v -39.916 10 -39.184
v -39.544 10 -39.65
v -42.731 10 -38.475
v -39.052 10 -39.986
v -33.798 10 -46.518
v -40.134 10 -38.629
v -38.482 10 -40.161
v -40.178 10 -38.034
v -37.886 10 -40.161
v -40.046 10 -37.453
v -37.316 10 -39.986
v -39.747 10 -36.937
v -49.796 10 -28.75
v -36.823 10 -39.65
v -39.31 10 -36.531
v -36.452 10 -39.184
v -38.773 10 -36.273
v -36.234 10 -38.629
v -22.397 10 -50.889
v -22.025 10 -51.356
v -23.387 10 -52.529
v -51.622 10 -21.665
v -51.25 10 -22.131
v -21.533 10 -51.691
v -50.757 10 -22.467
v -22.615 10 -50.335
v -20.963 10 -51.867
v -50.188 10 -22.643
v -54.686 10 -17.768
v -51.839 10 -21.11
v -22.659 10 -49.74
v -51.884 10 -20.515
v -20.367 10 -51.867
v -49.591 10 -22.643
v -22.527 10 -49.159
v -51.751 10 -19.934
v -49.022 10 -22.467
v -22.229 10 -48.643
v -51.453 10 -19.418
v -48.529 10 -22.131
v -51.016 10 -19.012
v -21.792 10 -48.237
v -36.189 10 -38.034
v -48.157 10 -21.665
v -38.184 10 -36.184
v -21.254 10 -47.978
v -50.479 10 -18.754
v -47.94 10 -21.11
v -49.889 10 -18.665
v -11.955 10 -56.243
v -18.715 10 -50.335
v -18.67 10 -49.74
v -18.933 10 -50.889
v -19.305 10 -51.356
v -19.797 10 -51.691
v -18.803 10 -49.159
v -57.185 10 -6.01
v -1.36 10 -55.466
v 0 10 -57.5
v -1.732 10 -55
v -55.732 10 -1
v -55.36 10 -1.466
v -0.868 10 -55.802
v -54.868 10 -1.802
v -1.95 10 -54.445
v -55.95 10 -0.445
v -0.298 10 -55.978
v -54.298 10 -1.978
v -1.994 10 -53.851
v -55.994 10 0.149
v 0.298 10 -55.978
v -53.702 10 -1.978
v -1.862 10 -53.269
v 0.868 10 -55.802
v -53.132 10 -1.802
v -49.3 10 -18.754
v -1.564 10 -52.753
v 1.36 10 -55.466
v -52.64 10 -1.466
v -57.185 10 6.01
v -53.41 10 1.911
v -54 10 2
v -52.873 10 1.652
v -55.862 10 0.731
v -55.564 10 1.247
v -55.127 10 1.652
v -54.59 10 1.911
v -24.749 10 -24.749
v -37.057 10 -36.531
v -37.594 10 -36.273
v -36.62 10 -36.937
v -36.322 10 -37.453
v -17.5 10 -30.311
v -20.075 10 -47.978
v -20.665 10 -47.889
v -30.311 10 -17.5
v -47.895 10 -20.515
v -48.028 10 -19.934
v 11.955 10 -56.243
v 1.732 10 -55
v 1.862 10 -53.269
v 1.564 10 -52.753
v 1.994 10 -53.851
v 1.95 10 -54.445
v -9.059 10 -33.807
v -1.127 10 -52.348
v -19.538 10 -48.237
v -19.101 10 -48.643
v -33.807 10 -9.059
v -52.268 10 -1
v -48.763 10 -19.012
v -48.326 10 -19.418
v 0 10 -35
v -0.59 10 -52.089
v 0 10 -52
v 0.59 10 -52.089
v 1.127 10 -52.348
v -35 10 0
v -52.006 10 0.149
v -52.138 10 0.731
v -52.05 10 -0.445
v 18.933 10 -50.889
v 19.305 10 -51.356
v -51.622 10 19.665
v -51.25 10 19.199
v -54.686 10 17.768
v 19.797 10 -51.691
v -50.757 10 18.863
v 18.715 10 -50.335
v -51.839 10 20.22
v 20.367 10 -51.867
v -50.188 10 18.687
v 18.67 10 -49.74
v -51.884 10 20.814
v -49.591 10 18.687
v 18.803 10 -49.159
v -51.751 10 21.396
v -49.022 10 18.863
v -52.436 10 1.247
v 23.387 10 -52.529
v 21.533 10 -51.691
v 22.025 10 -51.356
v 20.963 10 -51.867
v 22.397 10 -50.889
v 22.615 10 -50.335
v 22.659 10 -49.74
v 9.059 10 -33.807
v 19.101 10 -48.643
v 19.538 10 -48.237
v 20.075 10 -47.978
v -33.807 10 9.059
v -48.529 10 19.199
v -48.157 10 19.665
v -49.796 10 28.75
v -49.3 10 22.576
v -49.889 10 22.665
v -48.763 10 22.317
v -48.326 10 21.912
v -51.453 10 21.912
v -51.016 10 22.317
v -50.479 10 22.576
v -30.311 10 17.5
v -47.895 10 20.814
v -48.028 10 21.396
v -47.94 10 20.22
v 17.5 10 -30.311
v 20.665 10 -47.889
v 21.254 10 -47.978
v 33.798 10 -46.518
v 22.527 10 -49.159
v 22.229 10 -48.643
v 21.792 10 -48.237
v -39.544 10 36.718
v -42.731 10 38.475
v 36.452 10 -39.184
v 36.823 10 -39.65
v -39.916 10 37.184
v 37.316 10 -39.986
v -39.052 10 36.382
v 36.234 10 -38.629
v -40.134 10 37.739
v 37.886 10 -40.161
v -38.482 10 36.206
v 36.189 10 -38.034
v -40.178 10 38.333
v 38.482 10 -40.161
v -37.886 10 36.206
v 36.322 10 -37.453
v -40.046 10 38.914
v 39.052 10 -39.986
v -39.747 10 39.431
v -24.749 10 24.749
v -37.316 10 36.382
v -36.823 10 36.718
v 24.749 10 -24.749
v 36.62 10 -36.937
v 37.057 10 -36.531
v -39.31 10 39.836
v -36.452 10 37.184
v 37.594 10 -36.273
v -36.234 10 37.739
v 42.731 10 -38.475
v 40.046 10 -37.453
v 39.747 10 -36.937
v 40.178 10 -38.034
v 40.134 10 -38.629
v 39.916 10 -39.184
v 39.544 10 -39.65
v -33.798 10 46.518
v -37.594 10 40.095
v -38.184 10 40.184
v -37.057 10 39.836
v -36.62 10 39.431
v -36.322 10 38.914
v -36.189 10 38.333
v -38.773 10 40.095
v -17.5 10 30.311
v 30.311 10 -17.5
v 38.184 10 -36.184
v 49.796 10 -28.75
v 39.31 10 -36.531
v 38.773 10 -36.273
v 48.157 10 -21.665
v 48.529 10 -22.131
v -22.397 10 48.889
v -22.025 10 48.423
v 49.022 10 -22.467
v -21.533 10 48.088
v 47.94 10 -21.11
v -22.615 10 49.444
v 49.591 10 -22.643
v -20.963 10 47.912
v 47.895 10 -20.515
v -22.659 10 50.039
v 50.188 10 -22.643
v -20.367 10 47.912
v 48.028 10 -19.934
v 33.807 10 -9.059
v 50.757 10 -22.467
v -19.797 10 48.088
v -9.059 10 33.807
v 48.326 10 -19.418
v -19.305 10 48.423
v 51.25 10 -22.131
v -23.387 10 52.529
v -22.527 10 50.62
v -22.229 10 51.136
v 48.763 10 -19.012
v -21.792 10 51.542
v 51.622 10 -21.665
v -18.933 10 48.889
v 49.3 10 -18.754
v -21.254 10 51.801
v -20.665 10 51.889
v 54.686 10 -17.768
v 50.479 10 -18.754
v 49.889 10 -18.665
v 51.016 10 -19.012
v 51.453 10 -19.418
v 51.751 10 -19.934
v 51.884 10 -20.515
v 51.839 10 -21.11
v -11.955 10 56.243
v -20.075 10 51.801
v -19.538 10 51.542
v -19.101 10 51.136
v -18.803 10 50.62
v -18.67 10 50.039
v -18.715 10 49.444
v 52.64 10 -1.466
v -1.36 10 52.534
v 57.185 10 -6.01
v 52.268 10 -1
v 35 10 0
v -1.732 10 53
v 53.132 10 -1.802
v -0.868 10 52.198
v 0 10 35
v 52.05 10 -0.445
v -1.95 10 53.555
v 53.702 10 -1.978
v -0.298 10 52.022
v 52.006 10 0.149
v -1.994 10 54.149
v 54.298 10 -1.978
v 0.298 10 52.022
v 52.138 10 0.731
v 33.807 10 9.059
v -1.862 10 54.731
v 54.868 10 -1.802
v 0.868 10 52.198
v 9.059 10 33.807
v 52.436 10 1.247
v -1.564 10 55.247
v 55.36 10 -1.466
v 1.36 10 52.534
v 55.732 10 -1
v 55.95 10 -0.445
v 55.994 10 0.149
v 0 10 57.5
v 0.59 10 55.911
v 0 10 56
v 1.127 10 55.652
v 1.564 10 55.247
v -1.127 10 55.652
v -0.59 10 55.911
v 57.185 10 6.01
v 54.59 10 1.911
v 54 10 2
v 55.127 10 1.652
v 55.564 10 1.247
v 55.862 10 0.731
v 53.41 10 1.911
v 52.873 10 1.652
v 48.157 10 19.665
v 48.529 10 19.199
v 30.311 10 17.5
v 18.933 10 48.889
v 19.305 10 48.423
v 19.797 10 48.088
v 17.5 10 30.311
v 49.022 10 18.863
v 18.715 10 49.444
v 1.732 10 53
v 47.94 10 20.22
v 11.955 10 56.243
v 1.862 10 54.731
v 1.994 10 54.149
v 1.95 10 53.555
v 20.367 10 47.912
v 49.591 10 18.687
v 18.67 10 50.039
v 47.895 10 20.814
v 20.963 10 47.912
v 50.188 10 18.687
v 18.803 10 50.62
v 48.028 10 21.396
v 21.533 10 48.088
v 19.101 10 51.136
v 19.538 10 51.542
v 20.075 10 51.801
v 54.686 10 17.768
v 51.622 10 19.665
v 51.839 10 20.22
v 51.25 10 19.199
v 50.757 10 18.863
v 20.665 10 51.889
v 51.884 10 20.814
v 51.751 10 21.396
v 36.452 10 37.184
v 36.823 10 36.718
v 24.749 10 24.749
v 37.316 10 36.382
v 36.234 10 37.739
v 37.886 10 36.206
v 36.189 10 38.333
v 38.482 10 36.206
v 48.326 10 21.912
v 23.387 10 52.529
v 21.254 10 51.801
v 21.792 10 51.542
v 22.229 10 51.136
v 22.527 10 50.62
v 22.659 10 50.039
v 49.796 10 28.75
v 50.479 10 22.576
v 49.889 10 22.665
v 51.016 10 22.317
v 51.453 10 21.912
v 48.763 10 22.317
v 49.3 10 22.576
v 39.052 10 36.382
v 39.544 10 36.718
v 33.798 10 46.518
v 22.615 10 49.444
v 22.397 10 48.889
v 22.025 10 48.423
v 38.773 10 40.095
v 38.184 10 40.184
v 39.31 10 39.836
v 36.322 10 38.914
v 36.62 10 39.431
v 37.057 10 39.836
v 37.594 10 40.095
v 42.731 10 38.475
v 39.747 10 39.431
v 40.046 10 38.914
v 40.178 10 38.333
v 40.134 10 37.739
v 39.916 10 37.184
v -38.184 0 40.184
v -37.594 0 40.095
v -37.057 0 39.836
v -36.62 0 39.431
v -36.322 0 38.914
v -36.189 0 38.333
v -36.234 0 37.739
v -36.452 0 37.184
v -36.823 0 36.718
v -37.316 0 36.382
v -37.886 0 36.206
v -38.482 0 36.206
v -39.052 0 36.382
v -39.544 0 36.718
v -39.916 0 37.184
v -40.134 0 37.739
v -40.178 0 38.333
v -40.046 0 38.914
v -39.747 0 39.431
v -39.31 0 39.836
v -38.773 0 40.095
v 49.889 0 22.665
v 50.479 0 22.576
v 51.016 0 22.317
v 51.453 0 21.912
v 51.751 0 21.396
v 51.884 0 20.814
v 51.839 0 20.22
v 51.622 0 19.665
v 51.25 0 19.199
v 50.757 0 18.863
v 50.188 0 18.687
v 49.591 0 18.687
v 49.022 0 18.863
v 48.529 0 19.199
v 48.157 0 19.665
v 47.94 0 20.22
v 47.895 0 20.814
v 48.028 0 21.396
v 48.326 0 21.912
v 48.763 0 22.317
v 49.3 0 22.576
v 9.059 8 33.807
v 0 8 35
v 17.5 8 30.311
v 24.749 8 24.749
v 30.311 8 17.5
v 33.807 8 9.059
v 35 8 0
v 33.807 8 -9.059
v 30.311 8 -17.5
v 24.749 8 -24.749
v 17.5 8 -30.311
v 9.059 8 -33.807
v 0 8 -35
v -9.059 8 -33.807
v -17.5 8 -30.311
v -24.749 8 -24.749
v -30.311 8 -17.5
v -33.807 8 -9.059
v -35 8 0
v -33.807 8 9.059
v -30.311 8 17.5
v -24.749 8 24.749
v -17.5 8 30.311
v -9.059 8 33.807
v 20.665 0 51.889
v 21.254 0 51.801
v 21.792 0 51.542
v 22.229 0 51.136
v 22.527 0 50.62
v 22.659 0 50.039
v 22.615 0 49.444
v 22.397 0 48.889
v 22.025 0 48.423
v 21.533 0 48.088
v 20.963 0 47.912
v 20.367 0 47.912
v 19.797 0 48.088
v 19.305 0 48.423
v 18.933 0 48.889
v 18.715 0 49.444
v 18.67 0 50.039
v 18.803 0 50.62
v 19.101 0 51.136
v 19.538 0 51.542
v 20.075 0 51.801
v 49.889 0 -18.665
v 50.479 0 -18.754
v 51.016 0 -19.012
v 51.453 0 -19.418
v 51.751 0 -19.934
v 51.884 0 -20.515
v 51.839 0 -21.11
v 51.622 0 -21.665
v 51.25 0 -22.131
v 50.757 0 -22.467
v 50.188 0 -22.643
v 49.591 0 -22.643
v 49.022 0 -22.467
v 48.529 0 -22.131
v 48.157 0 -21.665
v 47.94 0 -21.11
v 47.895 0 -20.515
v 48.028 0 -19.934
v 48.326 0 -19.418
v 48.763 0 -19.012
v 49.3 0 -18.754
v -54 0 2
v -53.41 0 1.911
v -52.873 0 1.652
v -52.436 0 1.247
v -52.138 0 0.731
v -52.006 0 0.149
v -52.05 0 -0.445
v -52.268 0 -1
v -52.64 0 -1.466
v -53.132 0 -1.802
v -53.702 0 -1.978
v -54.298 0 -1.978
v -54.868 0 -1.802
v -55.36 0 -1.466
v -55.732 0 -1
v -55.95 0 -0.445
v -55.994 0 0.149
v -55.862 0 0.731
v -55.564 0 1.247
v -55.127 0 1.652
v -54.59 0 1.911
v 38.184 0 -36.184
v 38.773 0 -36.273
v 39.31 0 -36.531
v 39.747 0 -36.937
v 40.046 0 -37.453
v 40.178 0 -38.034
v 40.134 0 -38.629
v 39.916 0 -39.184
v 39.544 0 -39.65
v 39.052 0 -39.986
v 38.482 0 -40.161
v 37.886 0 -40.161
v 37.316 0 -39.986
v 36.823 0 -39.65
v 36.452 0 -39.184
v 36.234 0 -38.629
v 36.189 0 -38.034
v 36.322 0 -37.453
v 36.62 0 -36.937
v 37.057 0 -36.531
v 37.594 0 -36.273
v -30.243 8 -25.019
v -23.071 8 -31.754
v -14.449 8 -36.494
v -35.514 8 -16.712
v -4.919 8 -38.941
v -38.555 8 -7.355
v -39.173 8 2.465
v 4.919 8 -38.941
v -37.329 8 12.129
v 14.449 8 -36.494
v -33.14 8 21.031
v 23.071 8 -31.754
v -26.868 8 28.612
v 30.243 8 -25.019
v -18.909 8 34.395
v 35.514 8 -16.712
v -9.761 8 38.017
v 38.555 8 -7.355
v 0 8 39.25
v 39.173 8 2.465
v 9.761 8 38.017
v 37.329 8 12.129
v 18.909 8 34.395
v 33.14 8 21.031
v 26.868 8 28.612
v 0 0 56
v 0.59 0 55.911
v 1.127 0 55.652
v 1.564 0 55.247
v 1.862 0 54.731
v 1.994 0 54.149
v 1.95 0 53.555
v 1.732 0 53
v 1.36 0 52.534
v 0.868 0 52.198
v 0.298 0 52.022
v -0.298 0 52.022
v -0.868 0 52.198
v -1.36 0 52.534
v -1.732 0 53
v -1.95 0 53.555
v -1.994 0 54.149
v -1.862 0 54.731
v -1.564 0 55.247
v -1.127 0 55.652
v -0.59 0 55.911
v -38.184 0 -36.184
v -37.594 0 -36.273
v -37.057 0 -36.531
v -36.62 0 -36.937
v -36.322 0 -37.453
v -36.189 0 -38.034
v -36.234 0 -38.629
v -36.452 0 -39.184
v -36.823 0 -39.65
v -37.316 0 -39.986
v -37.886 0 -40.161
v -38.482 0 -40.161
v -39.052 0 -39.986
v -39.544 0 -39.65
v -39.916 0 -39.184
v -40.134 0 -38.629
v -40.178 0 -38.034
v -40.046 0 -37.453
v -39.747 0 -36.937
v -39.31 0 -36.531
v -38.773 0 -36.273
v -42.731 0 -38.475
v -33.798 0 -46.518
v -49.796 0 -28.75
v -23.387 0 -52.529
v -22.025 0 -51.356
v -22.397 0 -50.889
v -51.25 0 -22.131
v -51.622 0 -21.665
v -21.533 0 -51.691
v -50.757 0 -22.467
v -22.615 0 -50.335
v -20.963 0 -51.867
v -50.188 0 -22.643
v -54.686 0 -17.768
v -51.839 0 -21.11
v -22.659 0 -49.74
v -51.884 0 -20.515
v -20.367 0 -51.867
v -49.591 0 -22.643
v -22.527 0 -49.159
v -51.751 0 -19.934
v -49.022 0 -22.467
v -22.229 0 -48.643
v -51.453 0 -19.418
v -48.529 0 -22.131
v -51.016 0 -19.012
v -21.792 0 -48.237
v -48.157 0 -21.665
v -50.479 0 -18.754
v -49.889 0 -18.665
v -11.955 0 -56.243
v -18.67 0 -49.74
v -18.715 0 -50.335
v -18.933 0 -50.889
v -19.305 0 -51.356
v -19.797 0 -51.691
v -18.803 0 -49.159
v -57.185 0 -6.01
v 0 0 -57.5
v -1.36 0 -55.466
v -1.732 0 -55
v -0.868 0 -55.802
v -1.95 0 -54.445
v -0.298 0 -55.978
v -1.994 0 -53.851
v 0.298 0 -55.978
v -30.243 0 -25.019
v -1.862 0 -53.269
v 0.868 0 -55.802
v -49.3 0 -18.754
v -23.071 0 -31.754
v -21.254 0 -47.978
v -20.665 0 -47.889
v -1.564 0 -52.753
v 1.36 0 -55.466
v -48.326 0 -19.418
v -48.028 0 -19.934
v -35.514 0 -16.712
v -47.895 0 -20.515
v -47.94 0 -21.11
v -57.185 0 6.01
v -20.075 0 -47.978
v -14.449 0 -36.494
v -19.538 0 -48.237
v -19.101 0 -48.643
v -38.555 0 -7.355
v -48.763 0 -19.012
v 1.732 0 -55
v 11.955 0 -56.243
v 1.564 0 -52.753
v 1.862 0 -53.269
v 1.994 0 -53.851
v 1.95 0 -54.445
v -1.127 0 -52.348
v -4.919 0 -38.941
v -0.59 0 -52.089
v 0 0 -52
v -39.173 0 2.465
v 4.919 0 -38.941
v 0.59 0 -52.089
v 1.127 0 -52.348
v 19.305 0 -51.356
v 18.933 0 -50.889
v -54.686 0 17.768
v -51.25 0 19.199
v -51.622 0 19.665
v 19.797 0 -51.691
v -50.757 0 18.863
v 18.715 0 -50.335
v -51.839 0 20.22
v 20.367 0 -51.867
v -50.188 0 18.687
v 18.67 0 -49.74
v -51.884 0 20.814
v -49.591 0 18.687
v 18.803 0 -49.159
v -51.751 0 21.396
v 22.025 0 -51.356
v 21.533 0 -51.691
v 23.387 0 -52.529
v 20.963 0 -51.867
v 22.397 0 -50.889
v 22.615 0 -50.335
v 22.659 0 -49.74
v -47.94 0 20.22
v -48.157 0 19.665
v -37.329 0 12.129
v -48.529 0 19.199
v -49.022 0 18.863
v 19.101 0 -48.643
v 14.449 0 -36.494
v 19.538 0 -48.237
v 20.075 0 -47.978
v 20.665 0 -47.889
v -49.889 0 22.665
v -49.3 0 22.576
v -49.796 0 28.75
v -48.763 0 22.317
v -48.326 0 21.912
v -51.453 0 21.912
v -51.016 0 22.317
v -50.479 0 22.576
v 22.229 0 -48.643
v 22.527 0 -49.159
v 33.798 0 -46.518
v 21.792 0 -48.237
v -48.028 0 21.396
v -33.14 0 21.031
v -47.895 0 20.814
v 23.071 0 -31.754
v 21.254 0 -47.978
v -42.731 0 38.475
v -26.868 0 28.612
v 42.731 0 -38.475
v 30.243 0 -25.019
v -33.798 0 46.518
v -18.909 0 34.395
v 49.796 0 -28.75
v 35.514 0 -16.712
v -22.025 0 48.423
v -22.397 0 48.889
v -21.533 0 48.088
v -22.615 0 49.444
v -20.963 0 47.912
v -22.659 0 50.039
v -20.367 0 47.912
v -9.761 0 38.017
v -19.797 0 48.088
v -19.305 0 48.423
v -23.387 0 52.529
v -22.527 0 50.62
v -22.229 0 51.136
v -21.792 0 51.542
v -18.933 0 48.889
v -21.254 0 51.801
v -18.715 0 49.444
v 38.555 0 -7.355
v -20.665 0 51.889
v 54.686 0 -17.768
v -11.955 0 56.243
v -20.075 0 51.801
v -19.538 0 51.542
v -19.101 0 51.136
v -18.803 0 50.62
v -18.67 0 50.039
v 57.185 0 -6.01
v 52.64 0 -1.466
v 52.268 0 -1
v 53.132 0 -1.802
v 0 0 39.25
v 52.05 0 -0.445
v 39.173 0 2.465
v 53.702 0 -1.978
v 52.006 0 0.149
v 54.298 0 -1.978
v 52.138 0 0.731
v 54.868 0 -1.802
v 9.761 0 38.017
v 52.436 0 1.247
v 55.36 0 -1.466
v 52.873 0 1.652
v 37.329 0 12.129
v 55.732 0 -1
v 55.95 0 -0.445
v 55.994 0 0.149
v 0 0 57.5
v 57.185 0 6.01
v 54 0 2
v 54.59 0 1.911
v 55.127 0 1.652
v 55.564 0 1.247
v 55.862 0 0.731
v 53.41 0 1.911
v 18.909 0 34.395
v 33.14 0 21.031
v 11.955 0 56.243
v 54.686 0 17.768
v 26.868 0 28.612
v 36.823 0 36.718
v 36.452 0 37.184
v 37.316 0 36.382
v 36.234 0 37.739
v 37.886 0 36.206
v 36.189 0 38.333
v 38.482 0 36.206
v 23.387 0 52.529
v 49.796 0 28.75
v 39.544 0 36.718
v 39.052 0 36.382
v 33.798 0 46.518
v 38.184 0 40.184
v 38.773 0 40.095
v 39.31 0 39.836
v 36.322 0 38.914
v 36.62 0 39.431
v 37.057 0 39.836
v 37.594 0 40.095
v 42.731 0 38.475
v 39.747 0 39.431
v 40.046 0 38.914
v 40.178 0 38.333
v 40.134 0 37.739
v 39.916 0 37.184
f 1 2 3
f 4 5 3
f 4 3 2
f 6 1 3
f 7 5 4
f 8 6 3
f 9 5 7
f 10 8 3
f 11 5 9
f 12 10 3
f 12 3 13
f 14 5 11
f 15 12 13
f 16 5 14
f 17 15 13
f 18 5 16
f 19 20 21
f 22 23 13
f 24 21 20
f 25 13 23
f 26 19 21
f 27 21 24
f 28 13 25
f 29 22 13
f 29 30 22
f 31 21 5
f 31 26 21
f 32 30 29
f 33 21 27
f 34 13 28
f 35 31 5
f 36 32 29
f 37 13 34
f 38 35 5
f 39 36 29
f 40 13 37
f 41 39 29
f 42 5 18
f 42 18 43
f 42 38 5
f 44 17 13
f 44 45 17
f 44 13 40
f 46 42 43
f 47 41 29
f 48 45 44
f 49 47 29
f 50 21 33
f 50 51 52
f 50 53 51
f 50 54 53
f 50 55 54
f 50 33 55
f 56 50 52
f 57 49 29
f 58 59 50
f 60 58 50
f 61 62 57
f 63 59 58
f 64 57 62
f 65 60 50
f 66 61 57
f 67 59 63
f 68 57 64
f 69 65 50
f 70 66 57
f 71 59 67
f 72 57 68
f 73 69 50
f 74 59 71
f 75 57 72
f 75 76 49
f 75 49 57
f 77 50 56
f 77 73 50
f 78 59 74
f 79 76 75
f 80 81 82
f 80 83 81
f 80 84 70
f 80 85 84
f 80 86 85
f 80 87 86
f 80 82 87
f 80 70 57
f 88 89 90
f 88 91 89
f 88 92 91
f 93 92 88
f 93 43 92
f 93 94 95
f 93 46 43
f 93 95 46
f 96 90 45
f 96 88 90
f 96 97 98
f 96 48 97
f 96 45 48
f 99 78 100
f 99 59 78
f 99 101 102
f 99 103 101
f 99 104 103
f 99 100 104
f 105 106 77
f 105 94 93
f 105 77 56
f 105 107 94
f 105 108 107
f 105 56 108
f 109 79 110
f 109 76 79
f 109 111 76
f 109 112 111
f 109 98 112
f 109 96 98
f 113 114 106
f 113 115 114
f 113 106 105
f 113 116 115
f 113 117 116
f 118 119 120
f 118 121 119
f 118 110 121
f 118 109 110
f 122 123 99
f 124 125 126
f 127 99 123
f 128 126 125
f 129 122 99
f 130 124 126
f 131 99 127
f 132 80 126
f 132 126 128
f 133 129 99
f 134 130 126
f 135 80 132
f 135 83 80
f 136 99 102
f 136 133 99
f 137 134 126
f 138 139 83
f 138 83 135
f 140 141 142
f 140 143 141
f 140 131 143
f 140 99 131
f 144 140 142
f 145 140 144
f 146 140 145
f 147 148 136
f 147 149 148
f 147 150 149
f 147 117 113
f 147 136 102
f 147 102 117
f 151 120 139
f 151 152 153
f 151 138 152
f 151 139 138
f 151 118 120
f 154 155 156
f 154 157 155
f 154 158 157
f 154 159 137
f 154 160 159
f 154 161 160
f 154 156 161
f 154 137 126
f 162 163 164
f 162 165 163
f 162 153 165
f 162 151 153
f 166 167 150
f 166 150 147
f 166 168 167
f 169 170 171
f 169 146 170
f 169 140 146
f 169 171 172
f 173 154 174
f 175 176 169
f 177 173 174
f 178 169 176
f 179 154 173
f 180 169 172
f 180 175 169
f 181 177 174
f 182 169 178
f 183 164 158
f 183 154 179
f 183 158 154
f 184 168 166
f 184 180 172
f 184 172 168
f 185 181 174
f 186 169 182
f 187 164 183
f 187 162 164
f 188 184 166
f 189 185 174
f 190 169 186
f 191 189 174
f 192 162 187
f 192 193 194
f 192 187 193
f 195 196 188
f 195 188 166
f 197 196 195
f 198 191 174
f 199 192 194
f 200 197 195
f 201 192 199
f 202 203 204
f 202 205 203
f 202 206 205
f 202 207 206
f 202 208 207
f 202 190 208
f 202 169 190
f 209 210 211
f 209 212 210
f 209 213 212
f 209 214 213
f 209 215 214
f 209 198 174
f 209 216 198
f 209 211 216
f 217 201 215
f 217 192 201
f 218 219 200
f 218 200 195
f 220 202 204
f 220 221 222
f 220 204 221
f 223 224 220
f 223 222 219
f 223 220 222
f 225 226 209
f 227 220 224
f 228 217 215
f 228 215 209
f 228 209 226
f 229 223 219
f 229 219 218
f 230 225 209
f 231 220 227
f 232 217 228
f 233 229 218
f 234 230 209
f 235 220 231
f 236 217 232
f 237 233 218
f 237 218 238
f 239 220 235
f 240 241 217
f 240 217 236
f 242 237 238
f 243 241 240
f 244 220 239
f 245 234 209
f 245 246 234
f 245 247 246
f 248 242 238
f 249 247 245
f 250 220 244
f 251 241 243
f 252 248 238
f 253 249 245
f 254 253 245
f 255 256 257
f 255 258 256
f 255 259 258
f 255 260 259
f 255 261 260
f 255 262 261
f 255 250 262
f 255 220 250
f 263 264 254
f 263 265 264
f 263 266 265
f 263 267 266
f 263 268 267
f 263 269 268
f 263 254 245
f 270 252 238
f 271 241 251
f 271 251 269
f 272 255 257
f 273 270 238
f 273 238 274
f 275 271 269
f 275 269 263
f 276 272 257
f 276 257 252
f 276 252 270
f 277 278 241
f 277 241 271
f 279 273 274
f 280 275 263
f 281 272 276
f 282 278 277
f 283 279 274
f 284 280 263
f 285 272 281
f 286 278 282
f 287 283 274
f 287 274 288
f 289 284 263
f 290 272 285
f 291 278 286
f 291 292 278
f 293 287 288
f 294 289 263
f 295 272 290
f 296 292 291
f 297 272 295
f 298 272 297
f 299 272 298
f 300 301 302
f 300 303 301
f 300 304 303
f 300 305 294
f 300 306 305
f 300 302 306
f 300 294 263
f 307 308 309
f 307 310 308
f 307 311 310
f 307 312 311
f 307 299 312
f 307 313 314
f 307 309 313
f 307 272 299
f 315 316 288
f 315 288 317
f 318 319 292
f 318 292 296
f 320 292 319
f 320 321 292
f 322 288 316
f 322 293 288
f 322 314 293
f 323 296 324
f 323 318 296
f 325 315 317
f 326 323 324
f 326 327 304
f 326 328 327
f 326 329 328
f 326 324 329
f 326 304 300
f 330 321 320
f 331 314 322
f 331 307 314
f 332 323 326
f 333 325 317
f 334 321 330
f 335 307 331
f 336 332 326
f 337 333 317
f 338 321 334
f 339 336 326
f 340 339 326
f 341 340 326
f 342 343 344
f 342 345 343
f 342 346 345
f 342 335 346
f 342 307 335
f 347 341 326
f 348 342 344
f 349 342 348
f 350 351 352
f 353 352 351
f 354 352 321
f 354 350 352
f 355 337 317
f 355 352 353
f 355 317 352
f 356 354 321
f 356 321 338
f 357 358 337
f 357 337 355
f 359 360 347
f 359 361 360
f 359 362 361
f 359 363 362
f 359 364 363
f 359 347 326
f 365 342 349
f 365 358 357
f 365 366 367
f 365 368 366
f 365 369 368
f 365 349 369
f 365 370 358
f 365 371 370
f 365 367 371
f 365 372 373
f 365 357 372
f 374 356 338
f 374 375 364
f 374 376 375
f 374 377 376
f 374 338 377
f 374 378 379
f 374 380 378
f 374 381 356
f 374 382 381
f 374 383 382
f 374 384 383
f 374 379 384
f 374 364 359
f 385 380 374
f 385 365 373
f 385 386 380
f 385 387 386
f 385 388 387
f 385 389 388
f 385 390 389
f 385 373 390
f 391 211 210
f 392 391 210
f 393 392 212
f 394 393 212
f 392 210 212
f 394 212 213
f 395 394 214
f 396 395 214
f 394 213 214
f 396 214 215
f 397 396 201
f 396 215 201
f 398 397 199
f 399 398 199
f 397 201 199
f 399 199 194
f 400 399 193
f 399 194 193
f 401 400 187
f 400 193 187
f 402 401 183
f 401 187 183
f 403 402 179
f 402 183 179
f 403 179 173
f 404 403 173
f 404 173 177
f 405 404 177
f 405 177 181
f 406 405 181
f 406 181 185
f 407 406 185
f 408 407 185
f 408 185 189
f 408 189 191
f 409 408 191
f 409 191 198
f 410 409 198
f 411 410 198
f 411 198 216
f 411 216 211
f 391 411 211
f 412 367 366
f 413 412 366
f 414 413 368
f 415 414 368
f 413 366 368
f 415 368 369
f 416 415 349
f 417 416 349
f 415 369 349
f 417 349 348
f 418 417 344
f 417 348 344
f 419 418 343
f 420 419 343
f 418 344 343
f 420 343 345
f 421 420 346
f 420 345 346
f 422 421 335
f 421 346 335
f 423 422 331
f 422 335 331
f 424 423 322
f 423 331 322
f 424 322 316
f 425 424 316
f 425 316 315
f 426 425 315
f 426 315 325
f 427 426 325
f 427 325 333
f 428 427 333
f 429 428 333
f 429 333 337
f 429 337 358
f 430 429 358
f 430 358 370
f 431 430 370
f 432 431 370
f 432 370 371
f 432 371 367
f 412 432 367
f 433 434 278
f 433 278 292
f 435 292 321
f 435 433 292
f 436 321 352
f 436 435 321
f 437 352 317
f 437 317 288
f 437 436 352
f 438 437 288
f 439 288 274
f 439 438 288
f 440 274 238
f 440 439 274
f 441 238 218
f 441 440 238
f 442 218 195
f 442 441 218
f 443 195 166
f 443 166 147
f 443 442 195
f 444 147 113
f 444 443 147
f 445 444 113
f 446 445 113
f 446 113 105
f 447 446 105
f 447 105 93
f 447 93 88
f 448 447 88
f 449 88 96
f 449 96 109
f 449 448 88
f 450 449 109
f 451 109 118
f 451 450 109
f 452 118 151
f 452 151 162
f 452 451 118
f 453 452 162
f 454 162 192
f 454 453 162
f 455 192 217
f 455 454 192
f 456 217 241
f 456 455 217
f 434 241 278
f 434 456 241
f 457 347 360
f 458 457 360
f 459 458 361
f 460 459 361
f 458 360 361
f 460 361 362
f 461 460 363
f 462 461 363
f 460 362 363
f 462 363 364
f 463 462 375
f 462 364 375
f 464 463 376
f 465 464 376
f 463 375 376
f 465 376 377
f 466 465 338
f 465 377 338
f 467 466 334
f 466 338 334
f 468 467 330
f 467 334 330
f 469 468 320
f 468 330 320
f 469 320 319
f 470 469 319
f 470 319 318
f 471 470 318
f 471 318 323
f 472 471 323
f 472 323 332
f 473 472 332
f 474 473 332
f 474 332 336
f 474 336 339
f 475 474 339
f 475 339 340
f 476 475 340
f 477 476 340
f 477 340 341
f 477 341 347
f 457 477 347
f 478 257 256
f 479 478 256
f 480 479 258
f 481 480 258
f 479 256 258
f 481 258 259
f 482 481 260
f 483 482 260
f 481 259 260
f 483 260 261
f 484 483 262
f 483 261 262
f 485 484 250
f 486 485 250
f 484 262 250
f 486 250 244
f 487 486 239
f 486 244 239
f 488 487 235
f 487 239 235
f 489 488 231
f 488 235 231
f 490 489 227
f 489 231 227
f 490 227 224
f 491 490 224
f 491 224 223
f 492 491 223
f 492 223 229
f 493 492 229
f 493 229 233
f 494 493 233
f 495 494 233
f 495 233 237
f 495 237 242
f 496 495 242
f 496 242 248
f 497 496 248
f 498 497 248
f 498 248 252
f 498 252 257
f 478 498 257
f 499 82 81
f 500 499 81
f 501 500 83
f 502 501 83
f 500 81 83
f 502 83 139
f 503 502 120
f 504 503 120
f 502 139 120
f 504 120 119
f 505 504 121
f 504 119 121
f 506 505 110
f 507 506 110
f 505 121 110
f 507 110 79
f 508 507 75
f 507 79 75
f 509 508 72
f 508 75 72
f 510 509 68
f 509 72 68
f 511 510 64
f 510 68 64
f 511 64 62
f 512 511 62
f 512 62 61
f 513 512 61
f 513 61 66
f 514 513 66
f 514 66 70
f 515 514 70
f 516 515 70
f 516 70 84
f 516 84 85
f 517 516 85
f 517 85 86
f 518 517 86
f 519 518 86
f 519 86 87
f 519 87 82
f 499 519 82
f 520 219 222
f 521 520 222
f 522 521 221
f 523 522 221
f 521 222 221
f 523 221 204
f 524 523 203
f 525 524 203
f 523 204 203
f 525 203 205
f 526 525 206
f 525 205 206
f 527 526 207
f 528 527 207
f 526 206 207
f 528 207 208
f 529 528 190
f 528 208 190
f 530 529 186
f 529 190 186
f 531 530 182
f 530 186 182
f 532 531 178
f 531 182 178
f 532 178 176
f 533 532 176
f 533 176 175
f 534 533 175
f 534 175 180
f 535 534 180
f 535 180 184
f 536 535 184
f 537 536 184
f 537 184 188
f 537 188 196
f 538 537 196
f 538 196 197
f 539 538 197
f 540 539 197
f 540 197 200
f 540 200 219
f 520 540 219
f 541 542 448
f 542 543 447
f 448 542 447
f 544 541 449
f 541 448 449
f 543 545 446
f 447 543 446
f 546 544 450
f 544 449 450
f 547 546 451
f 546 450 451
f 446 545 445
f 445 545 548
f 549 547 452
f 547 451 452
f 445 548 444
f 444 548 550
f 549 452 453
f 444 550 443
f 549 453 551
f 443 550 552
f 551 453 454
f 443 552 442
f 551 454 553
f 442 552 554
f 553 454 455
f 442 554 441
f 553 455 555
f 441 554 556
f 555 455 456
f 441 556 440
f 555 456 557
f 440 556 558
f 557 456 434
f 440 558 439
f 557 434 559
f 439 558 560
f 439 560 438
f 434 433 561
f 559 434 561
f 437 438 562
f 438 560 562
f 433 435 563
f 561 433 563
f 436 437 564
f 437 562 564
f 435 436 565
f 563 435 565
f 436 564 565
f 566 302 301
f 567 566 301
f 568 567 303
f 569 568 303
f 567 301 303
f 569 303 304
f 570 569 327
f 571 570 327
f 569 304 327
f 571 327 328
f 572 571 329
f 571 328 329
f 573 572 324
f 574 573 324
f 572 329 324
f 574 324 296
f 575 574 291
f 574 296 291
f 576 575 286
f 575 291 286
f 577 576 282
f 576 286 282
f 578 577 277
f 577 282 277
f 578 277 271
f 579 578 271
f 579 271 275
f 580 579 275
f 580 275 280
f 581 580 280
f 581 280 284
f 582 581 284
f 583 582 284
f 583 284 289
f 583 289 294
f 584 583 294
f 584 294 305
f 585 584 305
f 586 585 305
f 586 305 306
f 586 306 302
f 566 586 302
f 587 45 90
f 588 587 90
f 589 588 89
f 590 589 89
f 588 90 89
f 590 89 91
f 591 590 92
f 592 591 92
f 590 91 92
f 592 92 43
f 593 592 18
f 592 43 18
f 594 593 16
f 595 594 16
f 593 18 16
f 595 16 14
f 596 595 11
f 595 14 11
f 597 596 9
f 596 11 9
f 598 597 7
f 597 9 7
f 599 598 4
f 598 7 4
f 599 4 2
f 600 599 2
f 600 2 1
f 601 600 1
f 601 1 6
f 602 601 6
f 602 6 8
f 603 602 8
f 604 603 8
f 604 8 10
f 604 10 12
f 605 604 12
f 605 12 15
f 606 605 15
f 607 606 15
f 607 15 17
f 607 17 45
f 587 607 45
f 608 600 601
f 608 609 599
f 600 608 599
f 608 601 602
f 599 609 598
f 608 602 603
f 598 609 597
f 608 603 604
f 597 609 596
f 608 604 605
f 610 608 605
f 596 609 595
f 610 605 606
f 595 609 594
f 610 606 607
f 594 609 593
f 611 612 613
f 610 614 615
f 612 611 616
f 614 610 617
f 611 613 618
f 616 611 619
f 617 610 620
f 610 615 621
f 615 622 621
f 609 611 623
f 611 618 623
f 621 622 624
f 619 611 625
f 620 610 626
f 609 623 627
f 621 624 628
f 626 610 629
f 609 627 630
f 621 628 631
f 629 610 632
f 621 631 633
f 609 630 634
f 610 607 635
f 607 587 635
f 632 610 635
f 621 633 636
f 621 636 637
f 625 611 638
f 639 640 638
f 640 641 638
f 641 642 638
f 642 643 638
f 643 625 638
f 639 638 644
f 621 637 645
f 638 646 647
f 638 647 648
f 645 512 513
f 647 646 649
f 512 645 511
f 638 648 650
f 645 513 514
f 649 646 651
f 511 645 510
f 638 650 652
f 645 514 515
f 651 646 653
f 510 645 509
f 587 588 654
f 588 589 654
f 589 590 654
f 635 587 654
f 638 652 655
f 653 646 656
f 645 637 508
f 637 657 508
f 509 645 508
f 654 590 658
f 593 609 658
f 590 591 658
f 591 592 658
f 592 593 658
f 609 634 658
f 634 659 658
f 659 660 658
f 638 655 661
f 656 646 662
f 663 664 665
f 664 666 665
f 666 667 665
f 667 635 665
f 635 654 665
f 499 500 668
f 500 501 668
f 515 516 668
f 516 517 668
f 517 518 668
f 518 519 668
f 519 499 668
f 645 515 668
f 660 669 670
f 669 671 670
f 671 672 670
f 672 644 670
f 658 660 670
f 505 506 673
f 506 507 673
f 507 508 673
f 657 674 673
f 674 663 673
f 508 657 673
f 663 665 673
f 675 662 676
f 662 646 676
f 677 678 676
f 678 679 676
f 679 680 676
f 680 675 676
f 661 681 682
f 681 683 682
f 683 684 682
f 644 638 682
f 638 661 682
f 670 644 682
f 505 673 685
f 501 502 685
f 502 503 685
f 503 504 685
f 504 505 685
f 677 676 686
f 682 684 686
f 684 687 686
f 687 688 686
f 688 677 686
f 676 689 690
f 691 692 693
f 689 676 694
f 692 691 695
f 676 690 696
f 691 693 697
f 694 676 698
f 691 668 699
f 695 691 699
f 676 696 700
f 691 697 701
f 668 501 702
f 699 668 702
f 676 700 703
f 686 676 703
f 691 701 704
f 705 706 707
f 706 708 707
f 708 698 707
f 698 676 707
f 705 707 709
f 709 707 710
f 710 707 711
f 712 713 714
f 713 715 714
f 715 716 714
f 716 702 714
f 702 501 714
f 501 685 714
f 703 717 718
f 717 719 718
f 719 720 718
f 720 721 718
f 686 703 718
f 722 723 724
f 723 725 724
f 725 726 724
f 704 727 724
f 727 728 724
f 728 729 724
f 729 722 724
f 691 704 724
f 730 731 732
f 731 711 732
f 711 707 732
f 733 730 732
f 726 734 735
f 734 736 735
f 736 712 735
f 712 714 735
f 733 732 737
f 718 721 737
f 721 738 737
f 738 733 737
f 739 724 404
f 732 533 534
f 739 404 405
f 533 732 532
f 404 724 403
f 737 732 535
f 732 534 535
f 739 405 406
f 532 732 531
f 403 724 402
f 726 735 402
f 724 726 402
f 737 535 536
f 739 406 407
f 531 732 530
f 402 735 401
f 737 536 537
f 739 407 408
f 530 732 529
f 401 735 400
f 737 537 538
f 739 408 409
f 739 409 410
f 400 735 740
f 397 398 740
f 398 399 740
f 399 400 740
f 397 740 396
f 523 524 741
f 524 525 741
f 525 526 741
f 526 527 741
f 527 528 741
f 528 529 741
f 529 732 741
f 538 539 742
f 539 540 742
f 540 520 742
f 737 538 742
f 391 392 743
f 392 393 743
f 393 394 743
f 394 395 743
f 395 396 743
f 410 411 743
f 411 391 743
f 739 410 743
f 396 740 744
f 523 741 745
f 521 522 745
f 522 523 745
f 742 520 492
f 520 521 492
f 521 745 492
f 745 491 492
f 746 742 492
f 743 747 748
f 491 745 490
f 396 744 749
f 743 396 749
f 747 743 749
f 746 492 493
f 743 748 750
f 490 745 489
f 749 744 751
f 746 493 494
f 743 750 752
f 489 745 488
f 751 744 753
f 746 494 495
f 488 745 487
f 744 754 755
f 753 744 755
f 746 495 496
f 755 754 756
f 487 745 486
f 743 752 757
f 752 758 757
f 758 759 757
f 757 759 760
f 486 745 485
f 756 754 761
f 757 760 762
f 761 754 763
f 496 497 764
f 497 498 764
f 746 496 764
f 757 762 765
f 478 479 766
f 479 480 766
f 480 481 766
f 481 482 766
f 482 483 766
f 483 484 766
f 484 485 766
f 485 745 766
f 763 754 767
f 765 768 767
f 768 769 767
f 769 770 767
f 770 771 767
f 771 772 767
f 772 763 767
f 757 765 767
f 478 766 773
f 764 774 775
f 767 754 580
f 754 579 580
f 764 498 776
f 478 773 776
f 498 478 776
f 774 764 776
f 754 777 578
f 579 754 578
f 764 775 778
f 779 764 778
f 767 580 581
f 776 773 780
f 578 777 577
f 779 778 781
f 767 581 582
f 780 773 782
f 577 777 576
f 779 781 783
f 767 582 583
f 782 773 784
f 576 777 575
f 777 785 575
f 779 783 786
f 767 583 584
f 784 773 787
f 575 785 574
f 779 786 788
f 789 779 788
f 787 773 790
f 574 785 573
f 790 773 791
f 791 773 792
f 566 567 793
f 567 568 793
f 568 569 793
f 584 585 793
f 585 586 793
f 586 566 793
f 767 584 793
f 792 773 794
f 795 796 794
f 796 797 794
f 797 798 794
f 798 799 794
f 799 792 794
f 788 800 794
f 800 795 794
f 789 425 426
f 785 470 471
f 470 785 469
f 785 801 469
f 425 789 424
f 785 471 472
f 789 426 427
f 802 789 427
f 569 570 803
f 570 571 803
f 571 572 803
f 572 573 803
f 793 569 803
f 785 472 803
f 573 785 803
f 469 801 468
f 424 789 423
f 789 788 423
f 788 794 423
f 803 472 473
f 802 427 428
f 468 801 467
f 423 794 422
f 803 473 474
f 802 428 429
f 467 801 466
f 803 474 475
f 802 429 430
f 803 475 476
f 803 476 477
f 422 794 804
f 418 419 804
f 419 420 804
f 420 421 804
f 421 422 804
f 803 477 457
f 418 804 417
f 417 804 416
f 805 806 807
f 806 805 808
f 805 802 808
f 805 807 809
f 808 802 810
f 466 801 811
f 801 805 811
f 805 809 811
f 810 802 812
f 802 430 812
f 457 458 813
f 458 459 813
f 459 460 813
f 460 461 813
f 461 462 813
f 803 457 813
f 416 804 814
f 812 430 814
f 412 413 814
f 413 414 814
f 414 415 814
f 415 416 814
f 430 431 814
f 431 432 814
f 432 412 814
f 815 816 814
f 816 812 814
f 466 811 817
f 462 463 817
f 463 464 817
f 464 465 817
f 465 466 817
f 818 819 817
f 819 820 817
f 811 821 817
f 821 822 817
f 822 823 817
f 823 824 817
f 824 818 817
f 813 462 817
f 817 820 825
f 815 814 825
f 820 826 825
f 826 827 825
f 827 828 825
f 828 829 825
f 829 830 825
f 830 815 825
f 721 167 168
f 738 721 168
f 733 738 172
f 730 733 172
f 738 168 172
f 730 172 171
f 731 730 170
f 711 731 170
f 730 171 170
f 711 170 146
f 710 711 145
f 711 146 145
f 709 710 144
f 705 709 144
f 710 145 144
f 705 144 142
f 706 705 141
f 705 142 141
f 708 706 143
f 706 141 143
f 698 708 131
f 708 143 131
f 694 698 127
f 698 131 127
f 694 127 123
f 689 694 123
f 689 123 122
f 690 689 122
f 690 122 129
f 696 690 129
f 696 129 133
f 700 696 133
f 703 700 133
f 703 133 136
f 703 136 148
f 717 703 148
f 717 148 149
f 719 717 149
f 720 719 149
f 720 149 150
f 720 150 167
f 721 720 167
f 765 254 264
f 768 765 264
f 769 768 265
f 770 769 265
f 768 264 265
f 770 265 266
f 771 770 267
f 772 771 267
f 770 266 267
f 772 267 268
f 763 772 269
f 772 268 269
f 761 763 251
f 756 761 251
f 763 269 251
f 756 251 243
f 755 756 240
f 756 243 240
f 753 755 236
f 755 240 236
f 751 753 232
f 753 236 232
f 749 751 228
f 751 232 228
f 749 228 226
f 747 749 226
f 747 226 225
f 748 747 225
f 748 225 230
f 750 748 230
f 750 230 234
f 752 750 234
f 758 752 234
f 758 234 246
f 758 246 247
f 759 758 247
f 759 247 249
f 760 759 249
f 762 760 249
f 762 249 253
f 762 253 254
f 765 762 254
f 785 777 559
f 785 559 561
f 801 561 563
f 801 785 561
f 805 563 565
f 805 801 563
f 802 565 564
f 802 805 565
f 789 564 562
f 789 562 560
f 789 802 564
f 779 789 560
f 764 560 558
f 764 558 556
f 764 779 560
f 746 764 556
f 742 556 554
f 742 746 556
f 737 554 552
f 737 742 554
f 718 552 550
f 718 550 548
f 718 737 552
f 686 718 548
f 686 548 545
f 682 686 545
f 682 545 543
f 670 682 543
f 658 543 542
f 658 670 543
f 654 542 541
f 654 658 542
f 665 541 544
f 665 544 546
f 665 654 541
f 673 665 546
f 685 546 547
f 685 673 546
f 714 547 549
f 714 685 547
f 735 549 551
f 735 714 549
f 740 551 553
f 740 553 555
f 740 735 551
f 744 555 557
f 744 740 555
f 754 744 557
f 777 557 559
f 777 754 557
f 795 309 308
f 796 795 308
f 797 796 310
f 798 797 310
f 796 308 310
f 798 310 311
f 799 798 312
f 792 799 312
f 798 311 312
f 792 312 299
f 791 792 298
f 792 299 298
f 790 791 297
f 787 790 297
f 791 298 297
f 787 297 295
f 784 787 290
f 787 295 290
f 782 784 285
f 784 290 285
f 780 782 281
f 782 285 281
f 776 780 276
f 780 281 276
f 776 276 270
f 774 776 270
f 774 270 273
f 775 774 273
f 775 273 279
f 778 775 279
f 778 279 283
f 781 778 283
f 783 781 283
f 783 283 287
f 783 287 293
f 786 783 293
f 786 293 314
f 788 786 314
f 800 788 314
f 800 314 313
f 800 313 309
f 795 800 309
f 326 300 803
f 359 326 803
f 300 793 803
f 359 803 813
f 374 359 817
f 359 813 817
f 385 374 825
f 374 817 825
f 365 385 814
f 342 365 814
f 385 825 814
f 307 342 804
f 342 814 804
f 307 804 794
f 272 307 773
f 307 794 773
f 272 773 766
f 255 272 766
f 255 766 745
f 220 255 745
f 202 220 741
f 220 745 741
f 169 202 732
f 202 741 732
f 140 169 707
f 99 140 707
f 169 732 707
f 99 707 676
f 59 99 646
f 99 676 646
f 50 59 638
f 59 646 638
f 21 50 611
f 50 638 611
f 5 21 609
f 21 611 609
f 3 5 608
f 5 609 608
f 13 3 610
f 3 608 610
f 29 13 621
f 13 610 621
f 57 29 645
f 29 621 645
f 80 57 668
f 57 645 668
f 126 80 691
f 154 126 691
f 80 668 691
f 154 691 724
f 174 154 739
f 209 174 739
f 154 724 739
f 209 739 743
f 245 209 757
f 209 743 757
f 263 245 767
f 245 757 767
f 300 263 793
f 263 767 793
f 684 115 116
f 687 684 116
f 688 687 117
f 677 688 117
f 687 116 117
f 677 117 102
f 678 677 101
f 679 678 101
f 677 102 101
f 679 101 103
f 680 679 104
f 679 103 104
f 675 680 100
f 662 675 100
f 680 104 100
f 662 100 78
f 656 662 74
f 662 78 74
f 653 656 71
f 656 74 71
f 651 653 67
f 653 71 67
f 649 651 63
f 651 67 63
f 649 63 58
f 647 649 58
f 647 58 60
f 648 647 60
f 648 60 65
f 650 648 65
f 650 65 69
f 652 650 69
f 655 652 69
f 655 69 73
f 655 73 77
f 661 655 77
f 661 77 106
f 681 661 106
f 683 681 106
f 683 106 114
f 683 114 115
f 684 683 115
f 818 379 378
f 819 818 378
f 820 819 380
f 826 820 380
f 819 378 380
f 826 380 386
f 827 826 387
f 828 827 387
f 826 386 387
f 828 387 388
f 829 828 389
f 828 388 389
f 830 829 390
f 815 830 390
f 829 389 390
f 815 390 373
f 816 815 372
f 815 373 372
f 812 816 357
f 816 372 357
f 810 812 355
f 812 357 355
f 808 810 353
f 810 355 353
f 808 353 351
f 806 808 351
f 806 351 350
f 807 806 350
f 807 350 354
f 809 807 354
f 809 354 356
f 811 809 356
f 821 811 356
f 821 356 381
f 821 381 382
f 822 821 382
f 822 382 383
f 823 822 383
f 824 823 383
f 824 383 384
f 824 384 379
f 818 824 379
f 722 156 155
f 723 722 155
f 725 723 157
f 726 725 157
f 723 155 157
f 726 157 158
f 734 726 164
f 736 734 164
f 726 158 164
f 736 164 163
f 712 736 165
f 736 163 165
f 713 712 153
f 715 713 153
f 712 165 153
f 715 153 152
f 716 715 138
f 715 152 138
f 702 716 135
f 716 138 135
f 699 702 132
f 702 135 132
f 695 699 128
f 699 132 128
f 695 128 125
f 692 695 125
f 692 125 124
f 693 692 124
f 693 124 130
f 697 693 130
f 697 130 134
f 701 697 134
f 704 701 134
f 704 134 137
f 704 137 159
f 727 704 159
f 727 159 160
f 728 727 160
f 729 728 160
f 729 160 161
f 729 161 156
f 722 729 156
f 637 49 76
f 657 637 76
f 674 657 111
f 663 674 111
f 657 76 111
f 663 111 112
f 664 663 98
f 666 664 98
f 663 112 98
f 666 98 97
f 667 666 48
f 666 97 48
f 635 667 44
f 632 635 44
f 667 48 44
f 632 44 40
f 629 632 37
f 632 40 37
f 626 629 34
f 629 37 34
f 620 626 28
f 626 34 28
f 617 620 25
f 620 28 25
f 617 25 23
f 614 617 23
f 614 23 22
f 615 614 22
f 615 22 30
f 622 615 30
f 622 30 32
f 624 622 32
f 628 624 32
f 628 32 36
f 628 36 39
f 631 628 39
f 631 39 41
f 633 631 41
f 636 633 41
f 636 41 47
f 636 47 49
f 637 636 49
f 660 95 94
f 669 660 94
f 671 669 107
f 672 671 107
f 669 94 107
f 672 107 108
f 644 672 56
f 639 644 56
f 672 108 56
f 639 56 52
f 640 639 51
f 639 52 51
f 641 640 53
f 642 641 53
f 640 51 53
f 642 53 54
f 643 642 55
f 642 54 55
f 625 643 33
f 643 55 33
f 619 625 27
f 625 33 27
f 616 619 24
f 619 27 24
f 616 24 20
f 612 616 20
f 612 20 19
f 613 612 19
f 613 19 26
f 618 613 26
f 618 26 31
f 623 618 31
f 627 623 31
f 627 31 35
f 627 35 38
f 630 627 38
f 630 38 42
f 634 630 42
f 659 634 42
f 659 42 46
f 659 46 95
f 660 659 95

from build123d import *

# Parameters (mm, degrees)
SKETCH1_R           = 57.5
SKETCH1_R_2         = 39.25
BOSS_EXTRUDE1_DEPTH = 8
SKETCH3_R           = 57.5
SKETCH3_R_2         = 35
BOSS_EXTRUDE2_DEPTH = 2
SKETCH2_R           = 2
CUT_EXTRUDE1_DEPTH  = 25


with BuildPart() as part:
    # Sketch1 → Boss-Extrude1 (new body)
    with BuildSketch(Plane(origin=(0, 0, 0), x_dir=(1, 0, 0), z_dir=(0, 1, 0))):
        with Locations(Location((0, 0, 0), (0, 0, 270))):
            Circle(SKETCH1_R)
        with Locations(Location((0, 0, 0), (0, 0, 270))):
            Circle(SKETCH1_R_2, mode=Mode.SUBTRACT)
    extrude(amount=BOSS_EXTRUDE1_DEPTH)

    # Sketch3 → Boss-Extrude2 (add)
    with BuildSketch(Plane(origin=(0, 8, 0), x_dir=(1, 0, 0), z_dir=(0, 1, 0))):
        with Locations(Location((0, 0, 0), (0, 0, 270))):
            Circle(SKETCH3_R)
        with Locations(Location((0, 0, 0), (0, 0, 270))):
            Circle(SKETCH3_R_2, mode=Mode.SUBTRACT)
    extrude(amount=BOSS_EXTRUDE2_DEPTH)

    # Sketch2 → Cut-Extrude1 (cut)
    with BuildSketch(Plane(origin=(0, 10, 0), x_dir=(1, 0, 0), z_dir=(0, 1, 0))):
        with Locations(Location((0, 54, 0), (0, 0, 270))):
            Circle(SKETCH2_R)
        with Locations(Location((20.664905348, 49.889494756, 0), (0, 0, 270))):
            Circle(SKETCH2_R)
        with Locations(Location((38.183766184, 38.183766184, 0), (0, 0, 270))):
            Circle(SKETCH2_R)
        with Locations(Location((49.889494756, 20.664905348, 0), (0, 0, 270))):
            Circle(SKETCH2_R)
        with Locations(Location((54, 0, 0), (0, 0, 270))):
            Circle(SKETCH2_R)
        with Locations(Location((49.889494756, -20.664905348, 0), (0, 0, 270))):
            Circle(SKETCH2_R)
        with Locations(Location((38.183766184, -38.183766184, 0), (0, 0, 270))):
            Circle(SKETCH2_R)
        with Locations(Location((20.664905348, -49.889494756, 0), (0, 0, 270))):
            Circle(SKETCH2_R)
        with Locations(Location((0, -54, 0), (0, 0, 270))):
            Circle(SKETCH2_R)
        with Locations(Location((-20.664905348, -49.889494756, 0), (0, 0, 270))):
            Circle(SKETCH2_R)
        with Locations(Location((-38.183766184, -38.183766184, 0), (0, 0, 270))):
            Circle(SKETCH2_R)
        with Locations(Location((-49.889494756, -20.664905348, 0), (0, 0, 270))):
            Circle(SKETCH2_R)
        with Locations(Location((-54, 0, 0), (0, 0, 270))):
            Circle(SKETCH2_R)
        with Locations(Location((-49.889494756, 20.664905348, 0), (0, 0, 270))):
            Circle(SKETCH2_R)
        with Locations(Location((-38.183766184, 38.183766184, 0), (0, 0, 270))):
            Circle(SKETCH2_R)
        with Locations(Location((-20.664905348, 49.889494756, 0), (0, 0, 270))):
            Circle(SKETCH2_R)
    extrude(amount=-CUT_EXTRUDE1_DEPTH, mode=Mode.SUBTRACT)


solid = part.part
